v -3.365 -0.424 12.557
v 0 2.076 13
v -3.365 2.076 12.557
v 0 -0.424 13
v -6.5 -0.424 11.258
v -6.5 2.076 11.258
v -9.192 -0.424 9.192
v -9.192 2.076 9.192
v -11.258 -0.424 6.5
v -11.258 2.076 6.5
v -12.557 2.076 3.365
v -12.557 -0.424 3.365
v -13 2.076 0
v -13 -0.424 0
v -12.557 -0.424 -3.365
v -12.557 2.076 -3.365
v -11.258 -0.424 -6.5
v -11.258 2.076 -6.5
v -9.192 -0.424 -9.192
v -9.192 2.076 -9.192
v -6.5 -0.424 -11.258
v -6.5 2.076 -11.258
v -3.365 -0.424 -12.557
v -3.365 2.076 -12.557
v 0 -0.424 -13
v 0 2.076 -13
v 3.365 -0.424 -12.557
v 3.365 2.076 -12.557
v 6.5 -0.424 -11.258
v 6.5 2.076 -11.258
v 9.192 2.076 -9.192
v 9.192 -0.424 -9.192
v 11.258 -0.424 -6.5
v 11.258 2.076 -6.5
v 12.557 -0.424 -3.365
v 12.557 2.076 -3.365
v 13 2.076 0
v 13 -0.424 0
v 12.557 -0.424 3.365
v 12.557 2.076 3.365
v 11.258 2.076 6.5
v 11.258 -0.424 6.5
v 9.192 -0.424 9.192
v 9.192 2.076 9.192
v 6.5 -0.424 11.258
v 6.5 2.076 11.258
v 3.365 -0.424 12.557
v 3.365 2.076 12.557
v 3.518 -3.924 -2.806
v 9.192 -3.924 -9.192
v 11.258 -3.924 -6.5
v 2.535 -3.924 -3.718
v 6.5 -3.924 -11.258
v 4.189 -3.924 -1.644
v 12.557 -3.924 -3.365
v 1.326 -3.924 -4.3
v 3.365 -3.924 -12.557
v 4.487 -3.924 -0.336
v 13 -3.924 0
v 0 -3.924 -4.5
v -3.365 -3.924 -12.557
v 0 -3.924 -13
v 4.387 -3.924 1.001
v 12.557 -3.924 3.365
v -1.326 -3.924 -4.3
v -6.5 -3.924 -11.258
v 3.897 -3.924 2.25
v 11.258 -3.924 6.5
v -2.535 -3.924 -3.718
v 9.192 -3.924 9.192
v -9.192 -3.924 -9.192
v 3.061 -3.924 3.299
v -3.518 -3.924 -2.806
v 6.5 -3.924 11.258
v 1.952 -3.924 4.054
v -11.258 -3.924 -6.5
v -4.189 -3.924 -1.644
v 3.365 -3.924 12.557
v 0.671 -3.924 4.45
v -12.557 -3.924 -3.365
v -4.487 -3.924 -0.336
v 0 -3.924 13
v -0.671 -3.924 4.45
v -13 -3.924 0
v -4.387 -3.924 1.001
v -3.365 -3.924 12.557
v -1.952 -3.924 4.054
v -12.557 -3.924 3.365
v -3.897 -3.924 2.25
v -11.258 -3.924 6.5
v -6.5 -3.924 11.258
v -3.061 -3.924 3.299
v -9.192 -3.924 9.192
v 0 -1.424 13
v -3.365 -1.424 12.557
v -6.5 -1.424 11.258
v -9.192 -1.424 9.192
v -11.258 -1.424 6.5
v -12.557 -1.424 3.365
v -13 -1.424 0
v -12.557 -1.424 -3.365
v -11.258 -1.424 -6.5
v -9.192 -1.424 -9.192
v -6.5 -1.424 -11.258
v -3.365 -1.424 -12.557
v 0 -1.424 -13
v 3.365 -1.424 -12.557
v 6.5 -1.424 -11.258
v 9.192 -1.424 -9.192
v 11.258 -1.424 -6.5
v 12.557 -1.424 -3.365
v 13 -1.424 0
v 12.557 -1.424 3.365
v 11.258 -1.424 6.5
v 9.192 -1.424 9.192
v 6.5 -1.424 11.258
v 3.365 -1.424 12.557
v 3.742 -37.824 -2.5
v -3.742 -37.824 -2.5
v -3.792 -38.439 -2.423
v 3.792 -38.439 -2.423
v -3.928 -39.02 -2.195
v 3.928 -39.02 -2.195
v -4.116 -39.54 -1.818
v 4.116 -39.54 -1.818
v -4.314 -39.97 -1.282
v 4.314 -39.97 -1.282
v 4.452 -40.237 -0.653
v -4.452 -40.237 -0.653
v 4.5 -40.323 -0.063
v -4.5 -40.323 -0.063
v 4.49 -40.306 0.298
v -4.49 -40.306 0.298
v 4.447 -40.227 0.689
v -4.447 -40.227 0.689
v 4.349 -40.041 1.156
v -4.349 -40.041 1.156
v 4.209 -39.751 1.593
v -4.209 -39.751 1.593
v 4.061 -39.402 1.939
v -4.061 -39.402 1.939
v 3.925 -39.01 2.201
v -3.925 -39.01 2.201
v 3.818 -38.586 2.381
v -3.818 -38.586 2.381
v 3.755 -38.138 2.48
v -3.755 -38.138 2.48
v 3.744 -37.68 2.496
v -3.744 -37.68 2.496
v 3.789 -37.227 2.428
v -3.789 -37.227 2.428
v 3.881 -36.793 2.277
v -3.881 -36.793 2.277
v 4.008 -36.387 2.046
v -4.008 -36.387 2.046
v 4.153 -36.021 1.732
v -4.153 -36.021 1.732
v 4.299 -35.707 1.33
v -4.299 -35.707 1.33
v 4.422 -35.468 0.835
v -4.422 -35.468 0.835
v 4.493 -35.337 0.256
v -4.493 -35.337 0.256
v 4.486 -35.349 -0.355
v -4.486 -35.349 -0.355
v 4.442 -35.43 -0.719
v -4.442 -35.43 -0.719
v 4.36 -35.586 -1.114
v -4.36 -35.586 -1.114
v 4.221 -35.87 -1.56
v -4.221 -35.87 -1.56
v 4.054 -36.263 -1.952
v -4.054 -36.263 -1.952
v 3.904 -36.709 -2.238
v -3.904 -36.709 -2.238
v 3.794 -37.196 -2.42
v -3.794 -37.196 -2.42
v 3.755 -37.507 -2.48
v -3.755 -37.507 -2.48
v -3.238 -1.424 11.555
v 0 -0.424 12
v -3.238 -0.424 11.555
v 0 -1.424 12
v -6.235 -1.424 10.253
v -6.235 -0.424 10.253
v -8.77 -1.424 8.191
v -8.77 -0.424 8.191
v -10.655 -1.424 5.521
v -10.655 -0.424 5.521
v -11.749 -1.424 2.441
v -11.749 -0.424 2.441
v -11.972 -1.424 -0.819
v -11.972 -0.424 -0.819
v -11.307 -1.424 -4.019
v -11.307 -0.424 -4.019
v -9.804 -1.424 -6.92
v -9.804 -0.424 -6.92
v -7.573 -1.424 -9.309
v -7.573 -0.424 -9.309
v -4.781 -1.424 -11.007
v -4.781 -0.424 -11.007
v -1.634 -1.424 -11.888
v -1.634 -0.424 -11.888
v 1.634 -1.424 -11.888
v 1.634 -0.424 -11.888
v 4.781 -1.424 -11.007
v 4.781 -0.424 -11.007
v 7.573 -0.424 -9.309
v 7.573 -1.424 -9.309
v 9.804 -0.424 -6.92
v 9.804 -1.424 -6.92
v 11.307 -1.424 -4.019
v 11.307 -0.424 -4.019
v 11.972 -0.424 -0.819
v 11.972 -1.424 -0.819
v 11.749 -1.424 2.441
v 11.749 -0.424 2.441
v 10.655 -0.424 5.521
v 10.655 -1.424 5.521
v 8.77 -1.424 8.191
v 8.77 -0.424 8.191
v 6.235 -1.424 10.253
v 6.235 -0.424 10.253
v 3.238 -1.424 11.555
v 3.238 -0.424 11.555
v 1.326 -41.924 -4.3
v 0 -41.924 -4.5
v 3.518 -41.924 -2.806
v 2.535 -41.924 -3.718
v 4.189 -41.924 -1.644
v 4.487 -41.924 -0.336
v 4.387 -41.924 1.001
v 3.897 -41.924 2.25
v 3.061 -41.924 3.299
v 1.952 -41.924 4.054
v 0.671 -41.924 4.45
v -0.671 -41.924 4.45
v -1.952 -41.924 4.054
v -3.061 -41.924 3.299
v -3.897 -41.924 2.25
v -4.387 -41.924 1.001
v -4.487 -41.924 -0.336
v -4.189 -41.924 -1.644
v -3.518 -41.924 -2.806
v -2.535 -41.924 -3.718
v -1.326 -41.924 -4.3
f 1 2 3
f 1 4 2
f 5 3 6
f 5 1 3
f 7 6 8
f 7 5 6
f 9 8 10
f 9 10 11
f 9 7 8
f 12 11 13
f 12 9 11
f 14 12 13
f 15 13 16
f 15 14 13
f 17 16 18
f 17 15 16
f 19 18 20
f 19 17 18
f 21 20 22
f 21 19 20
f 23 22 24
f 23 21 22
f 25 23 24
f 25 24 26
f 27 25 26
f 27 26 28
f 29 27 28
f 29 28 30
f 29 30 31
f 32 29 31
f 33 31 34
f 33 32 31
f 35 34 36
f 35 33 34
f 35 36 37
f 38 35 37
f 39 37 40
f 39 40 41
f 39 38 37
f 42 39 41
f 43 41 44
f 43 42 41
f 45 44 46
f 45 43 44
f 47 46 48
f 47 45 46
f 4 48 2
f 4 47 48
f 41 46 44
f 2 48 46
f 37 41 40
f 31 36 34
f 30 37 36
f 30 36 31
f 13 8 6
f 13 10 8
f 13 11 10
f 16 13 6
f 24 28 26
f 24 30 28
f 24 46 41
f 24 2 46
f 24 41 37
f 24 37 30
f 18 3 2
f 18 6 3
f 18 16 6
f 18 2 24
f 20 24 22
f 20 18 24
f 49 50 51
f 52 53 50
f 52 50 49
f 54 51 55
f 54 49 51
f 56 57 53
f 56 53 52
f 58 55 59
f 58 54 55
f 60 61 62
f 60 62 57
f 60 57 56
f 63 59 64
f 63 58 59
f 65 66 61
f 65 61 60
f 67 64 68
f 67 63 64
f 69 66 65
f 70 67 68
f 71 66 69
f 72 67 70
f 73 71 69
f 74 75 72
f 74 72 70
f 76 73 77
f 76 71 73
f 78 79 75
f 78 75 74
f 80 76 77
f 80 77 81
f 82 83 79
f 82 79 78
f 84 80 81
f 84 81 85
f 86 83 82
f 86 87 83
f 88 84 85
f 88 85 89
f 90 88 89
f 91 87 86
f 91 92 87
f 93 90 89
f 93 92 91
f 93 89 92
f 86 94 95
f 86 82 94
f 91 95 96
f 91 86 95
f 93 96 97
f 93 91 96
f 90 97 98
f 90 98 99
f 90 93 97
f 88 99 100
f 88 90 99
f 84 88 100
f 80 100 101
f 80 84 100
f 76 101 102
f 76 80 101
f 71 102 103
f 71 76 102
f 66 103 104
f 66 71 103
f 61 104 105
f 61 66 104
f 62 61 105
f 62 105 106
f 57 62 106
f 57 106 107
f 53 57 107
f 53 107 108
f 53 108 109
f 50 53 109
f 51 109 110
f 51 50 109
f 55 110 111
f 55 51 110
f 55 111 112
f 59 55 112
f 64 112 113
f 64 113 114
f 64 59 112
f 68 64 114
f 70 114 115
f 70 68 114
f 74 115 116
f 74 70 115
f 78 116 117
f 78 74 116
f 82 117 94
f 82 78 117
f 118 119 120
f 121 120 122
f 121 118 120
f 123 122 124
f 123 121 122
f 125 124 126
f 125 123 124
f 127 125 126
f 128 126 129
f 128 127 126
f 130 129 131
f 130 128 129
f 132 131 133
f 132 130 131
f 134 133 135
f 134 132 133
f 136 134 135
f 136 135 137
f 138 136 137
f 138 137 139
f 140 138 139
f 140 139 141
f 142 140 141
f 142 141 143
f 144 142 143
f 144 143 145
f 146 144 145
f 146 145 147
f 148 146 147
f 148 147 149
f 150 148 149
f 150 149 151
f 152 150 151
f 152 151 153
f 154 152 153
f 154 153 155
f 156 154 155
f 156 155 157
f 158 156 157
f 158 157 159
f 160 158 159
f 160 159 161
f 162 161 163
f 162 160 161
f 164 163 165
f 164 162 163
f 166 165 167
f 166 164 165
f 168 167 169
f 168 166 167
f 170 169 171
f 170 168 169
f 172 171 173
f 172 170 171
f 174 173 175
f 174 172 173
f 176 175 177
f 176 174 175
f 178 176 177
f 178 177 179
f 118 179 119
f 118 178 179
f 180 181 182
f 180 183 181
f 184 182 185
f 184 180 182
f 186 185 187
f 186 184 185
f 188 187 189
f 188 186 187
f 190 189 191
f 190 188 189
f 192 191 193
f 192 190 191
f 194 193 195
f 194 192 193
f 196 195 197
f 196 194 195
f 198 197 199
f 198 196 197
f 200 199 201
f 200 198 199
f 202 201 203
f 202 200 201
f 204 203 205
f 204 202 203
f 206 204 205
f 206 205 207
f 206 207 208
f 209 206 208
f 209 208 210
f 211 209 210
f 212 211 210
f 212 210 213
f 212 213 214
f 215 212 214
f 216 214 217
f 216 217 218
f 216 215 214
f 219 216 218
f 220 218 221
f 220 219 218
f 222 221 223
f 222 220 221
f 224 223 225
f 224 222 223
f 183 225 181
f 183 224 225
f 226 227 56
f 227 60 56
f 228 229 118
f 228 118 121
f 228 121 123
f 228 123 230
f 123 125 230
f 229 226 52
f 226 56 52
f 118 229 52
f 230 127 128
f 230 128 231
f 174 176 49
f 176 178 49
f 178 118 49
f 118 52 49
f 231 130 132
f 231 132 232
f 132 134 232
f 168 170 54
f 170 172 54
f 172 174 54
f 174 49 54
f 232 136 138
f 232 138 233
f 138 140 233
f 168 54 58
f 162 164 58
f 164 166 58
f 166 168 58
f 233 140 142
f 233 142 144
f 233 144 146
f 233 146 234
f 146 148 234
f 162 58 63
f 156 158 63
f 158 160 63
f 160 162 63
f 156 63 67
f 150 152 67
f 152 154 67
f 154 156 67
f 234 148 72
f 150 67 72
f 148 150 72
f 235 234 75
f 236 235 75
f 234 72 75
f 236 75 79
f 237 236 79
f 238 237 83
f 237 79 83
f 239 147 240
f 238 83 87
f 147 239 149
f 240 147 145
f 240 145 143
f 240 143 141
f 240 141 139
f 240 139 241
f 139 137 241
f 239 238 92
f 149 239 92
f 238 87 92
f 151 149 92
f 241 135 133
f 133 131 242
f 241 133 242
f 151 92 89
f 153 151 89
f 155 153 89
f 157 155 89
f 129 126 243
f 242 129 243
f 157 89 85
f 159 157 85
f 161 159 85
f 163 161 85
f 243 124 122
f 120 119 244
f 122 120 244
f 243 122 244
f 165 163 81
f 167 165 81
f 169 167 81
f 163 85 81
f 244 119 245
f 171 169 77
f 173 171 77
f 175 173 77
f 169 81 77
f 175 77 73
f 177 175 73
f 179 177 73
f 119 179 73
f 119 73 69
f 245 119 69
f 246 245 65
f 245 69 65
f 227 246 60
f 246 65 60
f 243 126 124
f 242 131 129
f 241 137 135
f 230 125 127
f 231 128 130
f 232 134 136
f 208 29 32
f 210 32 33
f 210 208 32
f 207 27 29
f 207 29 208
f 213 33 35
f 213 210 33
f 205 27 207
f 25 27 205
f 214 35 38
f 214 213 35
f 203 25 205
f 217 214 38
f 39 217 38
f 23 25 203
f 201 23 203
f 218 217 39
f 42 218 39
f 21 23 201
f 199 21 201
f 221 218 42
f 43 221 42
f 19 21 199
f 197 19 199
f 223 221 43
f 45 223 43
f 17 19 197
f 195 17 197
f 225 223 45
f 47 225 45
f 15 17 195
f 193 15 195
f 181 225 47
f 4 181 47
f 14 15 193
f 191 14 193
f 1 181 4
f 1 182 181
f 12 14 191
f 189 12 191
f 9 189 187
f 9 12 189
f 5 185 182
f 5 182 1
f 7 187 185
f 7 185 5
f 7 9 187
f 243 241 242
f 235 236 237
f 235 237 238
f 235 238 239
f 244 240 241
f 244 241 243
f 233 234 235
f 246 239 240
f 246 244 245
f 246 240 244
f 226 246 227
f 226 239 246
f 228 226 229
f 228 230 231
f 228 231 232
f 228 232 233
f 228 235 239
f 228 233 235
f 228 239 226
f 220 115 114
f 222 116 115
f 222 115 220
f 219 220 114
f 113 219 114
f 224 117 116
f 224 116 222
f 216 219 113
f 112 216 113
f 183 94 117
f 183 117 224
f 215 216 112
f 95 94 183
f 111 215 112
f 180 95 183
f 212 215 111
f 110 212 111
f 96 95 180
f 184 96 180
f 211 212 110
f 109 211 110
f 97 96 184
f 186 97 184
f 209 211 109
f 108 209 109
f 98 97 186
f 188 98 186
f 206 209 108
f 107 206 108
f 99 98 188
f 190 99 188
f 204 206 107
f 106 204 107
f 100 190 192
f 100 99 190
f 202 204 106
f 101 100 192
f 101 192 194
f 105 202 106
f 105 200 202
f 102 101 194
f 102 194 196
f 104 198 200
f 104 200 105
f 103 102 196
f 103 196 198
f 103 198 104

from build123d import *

# Parameters (mm, degrees)
SKETCH2_R                = 4.5
BOSS_EXTRUDE1_DEPTH      = 30
BOSS_EXTRUDE2_DEPTH      = 1
BOSS_EXTRUDE2_DEPTH_BACK = 1
CUT_EXTRUDE3_DEPTH       = 48.765956346
SKETCH6_R                = 4.5
BOSS_EXTRUDE3_DEPTH      = 8
CUT_EXTRUDE2_DEPTH       = 8
CUT_EXTRUDE2_DEPTH_BACK  = 47.071926172
SKETCH4_R                = 2.5
CUT_EXTRUDE5_START       = -8
SKETCH7_R                = 6.95034237
SKETCH7_R_2              = 4.5
CUT_EXTRUDE5_DEPTH       = 8


with BuildPart() as part:
    # Sketch1 → Revolve1 (revolve)
    with BuildSketch(Plane.XY):
        Polygon((0, 2.075992783), (13, 2.075992783), (13, -0.424007217), (12, -0.424007217), (12, -1.424007217), (13, -1.424007217), (13, -3.924007217), (0, -3.924007217), align=None)
    revolve(axis=Axis((0, 49.311920993, 0), (0, -1, 0)))

    # Sketch2 → Boss-Extrude1 (add)
    with BuildSketch(Plane.XZ.offset(3.924007217)):
        Circle(SKETCH2_R)
    extrude(amount=BOSS_EXTRUDE1_DEPTH)

    # Sketch3 → Boss-Extrude2 (add, two sides: drawn at the far end of the back side and taken through both)
    with BuildSketch(Plane(origin=(0, 0, 0), x_dir=(0, 0, -1), z_dir=(1, 0, 0)).offset(-BOSS_EXTRUDE2_DEPTH_BACK)):
        with BuildLine():
            Line((0, -33.924007217), (-4.5, -33.924007217))
            ThreePointArc((-4.5, -33.924007217), (-2.081257447, -43.403287407), (5.954829972, -37.824007217))
            ThreePointArc((5.954829972, -37.824007217), (5.57928019, -35.74274977), (4.5, -33.924007217))
            Line((4.5, -33.924007217), (0, -33.924007217))
        make_face()
    extrude(amount=BOSS_EXTRUDE2_DEPTH + BOSS_EXTRUDE2_DEPTH_BACK)

    # Sketch5 → Cut-Extrude3 (cut, through all)
    with BuildSketch(Plane(origin=(1, 0, 0), x_dir=(0, 0, -1), z_dir=(1, 0, 0))):
        with BuildLine():
            Line((5.205457264, -40.715929532), (-5.205457264, -40.715929532))
            ThreePointArc((-5.205457264, -40.715929532), (0, -43.77883719), (5.205457264, -40.715929532))
        make_face()
    extrude(amount=-CUT_EXTRUDE3_DEPTH, mode=Mode.SUBTRACT)

    # Sketch6 → Boss-Extrude3 (add)
    with BuildSketch(Plane.XZ.offset(33.924007217)):
        Circle(SKETCH6_R)
    extrude(amount=BOSS_EXTRUDE3_DEPTH)

    # Sketch4 → Cut-Extrude2 (cut, two sides: drawn at the far end of the back side and taken through both)
    with BuildSketch(Plane.ZY.offset(1).offset(-CUT_EXTRUDE2_DEPTH_BACK)):
        with Locations((0, -37.824007217)):
            Circle(SKETCH4_R)
    extrude(amount=CUT_EXTRUDE2_DEPTH + CUT_EXTRUDE2_DEPTH_BACK, mode=Mode.SUBTRACT)

    # Sketch7 → Cut-Extrude5 (cut)
    with BuildSketch(Plane.XZ.offset(41.924007217).offset(CUT_EXTRUDE5_START)):
        Circle(SKETCH7_R)
        Circle(SKETCH7_R_2, mode=Mode.SUBTRACT)
    extrude(amount=CUT_EXTRUDE5_DEPTH, mode=Mode.SUBTRACT)


solid = part.part
